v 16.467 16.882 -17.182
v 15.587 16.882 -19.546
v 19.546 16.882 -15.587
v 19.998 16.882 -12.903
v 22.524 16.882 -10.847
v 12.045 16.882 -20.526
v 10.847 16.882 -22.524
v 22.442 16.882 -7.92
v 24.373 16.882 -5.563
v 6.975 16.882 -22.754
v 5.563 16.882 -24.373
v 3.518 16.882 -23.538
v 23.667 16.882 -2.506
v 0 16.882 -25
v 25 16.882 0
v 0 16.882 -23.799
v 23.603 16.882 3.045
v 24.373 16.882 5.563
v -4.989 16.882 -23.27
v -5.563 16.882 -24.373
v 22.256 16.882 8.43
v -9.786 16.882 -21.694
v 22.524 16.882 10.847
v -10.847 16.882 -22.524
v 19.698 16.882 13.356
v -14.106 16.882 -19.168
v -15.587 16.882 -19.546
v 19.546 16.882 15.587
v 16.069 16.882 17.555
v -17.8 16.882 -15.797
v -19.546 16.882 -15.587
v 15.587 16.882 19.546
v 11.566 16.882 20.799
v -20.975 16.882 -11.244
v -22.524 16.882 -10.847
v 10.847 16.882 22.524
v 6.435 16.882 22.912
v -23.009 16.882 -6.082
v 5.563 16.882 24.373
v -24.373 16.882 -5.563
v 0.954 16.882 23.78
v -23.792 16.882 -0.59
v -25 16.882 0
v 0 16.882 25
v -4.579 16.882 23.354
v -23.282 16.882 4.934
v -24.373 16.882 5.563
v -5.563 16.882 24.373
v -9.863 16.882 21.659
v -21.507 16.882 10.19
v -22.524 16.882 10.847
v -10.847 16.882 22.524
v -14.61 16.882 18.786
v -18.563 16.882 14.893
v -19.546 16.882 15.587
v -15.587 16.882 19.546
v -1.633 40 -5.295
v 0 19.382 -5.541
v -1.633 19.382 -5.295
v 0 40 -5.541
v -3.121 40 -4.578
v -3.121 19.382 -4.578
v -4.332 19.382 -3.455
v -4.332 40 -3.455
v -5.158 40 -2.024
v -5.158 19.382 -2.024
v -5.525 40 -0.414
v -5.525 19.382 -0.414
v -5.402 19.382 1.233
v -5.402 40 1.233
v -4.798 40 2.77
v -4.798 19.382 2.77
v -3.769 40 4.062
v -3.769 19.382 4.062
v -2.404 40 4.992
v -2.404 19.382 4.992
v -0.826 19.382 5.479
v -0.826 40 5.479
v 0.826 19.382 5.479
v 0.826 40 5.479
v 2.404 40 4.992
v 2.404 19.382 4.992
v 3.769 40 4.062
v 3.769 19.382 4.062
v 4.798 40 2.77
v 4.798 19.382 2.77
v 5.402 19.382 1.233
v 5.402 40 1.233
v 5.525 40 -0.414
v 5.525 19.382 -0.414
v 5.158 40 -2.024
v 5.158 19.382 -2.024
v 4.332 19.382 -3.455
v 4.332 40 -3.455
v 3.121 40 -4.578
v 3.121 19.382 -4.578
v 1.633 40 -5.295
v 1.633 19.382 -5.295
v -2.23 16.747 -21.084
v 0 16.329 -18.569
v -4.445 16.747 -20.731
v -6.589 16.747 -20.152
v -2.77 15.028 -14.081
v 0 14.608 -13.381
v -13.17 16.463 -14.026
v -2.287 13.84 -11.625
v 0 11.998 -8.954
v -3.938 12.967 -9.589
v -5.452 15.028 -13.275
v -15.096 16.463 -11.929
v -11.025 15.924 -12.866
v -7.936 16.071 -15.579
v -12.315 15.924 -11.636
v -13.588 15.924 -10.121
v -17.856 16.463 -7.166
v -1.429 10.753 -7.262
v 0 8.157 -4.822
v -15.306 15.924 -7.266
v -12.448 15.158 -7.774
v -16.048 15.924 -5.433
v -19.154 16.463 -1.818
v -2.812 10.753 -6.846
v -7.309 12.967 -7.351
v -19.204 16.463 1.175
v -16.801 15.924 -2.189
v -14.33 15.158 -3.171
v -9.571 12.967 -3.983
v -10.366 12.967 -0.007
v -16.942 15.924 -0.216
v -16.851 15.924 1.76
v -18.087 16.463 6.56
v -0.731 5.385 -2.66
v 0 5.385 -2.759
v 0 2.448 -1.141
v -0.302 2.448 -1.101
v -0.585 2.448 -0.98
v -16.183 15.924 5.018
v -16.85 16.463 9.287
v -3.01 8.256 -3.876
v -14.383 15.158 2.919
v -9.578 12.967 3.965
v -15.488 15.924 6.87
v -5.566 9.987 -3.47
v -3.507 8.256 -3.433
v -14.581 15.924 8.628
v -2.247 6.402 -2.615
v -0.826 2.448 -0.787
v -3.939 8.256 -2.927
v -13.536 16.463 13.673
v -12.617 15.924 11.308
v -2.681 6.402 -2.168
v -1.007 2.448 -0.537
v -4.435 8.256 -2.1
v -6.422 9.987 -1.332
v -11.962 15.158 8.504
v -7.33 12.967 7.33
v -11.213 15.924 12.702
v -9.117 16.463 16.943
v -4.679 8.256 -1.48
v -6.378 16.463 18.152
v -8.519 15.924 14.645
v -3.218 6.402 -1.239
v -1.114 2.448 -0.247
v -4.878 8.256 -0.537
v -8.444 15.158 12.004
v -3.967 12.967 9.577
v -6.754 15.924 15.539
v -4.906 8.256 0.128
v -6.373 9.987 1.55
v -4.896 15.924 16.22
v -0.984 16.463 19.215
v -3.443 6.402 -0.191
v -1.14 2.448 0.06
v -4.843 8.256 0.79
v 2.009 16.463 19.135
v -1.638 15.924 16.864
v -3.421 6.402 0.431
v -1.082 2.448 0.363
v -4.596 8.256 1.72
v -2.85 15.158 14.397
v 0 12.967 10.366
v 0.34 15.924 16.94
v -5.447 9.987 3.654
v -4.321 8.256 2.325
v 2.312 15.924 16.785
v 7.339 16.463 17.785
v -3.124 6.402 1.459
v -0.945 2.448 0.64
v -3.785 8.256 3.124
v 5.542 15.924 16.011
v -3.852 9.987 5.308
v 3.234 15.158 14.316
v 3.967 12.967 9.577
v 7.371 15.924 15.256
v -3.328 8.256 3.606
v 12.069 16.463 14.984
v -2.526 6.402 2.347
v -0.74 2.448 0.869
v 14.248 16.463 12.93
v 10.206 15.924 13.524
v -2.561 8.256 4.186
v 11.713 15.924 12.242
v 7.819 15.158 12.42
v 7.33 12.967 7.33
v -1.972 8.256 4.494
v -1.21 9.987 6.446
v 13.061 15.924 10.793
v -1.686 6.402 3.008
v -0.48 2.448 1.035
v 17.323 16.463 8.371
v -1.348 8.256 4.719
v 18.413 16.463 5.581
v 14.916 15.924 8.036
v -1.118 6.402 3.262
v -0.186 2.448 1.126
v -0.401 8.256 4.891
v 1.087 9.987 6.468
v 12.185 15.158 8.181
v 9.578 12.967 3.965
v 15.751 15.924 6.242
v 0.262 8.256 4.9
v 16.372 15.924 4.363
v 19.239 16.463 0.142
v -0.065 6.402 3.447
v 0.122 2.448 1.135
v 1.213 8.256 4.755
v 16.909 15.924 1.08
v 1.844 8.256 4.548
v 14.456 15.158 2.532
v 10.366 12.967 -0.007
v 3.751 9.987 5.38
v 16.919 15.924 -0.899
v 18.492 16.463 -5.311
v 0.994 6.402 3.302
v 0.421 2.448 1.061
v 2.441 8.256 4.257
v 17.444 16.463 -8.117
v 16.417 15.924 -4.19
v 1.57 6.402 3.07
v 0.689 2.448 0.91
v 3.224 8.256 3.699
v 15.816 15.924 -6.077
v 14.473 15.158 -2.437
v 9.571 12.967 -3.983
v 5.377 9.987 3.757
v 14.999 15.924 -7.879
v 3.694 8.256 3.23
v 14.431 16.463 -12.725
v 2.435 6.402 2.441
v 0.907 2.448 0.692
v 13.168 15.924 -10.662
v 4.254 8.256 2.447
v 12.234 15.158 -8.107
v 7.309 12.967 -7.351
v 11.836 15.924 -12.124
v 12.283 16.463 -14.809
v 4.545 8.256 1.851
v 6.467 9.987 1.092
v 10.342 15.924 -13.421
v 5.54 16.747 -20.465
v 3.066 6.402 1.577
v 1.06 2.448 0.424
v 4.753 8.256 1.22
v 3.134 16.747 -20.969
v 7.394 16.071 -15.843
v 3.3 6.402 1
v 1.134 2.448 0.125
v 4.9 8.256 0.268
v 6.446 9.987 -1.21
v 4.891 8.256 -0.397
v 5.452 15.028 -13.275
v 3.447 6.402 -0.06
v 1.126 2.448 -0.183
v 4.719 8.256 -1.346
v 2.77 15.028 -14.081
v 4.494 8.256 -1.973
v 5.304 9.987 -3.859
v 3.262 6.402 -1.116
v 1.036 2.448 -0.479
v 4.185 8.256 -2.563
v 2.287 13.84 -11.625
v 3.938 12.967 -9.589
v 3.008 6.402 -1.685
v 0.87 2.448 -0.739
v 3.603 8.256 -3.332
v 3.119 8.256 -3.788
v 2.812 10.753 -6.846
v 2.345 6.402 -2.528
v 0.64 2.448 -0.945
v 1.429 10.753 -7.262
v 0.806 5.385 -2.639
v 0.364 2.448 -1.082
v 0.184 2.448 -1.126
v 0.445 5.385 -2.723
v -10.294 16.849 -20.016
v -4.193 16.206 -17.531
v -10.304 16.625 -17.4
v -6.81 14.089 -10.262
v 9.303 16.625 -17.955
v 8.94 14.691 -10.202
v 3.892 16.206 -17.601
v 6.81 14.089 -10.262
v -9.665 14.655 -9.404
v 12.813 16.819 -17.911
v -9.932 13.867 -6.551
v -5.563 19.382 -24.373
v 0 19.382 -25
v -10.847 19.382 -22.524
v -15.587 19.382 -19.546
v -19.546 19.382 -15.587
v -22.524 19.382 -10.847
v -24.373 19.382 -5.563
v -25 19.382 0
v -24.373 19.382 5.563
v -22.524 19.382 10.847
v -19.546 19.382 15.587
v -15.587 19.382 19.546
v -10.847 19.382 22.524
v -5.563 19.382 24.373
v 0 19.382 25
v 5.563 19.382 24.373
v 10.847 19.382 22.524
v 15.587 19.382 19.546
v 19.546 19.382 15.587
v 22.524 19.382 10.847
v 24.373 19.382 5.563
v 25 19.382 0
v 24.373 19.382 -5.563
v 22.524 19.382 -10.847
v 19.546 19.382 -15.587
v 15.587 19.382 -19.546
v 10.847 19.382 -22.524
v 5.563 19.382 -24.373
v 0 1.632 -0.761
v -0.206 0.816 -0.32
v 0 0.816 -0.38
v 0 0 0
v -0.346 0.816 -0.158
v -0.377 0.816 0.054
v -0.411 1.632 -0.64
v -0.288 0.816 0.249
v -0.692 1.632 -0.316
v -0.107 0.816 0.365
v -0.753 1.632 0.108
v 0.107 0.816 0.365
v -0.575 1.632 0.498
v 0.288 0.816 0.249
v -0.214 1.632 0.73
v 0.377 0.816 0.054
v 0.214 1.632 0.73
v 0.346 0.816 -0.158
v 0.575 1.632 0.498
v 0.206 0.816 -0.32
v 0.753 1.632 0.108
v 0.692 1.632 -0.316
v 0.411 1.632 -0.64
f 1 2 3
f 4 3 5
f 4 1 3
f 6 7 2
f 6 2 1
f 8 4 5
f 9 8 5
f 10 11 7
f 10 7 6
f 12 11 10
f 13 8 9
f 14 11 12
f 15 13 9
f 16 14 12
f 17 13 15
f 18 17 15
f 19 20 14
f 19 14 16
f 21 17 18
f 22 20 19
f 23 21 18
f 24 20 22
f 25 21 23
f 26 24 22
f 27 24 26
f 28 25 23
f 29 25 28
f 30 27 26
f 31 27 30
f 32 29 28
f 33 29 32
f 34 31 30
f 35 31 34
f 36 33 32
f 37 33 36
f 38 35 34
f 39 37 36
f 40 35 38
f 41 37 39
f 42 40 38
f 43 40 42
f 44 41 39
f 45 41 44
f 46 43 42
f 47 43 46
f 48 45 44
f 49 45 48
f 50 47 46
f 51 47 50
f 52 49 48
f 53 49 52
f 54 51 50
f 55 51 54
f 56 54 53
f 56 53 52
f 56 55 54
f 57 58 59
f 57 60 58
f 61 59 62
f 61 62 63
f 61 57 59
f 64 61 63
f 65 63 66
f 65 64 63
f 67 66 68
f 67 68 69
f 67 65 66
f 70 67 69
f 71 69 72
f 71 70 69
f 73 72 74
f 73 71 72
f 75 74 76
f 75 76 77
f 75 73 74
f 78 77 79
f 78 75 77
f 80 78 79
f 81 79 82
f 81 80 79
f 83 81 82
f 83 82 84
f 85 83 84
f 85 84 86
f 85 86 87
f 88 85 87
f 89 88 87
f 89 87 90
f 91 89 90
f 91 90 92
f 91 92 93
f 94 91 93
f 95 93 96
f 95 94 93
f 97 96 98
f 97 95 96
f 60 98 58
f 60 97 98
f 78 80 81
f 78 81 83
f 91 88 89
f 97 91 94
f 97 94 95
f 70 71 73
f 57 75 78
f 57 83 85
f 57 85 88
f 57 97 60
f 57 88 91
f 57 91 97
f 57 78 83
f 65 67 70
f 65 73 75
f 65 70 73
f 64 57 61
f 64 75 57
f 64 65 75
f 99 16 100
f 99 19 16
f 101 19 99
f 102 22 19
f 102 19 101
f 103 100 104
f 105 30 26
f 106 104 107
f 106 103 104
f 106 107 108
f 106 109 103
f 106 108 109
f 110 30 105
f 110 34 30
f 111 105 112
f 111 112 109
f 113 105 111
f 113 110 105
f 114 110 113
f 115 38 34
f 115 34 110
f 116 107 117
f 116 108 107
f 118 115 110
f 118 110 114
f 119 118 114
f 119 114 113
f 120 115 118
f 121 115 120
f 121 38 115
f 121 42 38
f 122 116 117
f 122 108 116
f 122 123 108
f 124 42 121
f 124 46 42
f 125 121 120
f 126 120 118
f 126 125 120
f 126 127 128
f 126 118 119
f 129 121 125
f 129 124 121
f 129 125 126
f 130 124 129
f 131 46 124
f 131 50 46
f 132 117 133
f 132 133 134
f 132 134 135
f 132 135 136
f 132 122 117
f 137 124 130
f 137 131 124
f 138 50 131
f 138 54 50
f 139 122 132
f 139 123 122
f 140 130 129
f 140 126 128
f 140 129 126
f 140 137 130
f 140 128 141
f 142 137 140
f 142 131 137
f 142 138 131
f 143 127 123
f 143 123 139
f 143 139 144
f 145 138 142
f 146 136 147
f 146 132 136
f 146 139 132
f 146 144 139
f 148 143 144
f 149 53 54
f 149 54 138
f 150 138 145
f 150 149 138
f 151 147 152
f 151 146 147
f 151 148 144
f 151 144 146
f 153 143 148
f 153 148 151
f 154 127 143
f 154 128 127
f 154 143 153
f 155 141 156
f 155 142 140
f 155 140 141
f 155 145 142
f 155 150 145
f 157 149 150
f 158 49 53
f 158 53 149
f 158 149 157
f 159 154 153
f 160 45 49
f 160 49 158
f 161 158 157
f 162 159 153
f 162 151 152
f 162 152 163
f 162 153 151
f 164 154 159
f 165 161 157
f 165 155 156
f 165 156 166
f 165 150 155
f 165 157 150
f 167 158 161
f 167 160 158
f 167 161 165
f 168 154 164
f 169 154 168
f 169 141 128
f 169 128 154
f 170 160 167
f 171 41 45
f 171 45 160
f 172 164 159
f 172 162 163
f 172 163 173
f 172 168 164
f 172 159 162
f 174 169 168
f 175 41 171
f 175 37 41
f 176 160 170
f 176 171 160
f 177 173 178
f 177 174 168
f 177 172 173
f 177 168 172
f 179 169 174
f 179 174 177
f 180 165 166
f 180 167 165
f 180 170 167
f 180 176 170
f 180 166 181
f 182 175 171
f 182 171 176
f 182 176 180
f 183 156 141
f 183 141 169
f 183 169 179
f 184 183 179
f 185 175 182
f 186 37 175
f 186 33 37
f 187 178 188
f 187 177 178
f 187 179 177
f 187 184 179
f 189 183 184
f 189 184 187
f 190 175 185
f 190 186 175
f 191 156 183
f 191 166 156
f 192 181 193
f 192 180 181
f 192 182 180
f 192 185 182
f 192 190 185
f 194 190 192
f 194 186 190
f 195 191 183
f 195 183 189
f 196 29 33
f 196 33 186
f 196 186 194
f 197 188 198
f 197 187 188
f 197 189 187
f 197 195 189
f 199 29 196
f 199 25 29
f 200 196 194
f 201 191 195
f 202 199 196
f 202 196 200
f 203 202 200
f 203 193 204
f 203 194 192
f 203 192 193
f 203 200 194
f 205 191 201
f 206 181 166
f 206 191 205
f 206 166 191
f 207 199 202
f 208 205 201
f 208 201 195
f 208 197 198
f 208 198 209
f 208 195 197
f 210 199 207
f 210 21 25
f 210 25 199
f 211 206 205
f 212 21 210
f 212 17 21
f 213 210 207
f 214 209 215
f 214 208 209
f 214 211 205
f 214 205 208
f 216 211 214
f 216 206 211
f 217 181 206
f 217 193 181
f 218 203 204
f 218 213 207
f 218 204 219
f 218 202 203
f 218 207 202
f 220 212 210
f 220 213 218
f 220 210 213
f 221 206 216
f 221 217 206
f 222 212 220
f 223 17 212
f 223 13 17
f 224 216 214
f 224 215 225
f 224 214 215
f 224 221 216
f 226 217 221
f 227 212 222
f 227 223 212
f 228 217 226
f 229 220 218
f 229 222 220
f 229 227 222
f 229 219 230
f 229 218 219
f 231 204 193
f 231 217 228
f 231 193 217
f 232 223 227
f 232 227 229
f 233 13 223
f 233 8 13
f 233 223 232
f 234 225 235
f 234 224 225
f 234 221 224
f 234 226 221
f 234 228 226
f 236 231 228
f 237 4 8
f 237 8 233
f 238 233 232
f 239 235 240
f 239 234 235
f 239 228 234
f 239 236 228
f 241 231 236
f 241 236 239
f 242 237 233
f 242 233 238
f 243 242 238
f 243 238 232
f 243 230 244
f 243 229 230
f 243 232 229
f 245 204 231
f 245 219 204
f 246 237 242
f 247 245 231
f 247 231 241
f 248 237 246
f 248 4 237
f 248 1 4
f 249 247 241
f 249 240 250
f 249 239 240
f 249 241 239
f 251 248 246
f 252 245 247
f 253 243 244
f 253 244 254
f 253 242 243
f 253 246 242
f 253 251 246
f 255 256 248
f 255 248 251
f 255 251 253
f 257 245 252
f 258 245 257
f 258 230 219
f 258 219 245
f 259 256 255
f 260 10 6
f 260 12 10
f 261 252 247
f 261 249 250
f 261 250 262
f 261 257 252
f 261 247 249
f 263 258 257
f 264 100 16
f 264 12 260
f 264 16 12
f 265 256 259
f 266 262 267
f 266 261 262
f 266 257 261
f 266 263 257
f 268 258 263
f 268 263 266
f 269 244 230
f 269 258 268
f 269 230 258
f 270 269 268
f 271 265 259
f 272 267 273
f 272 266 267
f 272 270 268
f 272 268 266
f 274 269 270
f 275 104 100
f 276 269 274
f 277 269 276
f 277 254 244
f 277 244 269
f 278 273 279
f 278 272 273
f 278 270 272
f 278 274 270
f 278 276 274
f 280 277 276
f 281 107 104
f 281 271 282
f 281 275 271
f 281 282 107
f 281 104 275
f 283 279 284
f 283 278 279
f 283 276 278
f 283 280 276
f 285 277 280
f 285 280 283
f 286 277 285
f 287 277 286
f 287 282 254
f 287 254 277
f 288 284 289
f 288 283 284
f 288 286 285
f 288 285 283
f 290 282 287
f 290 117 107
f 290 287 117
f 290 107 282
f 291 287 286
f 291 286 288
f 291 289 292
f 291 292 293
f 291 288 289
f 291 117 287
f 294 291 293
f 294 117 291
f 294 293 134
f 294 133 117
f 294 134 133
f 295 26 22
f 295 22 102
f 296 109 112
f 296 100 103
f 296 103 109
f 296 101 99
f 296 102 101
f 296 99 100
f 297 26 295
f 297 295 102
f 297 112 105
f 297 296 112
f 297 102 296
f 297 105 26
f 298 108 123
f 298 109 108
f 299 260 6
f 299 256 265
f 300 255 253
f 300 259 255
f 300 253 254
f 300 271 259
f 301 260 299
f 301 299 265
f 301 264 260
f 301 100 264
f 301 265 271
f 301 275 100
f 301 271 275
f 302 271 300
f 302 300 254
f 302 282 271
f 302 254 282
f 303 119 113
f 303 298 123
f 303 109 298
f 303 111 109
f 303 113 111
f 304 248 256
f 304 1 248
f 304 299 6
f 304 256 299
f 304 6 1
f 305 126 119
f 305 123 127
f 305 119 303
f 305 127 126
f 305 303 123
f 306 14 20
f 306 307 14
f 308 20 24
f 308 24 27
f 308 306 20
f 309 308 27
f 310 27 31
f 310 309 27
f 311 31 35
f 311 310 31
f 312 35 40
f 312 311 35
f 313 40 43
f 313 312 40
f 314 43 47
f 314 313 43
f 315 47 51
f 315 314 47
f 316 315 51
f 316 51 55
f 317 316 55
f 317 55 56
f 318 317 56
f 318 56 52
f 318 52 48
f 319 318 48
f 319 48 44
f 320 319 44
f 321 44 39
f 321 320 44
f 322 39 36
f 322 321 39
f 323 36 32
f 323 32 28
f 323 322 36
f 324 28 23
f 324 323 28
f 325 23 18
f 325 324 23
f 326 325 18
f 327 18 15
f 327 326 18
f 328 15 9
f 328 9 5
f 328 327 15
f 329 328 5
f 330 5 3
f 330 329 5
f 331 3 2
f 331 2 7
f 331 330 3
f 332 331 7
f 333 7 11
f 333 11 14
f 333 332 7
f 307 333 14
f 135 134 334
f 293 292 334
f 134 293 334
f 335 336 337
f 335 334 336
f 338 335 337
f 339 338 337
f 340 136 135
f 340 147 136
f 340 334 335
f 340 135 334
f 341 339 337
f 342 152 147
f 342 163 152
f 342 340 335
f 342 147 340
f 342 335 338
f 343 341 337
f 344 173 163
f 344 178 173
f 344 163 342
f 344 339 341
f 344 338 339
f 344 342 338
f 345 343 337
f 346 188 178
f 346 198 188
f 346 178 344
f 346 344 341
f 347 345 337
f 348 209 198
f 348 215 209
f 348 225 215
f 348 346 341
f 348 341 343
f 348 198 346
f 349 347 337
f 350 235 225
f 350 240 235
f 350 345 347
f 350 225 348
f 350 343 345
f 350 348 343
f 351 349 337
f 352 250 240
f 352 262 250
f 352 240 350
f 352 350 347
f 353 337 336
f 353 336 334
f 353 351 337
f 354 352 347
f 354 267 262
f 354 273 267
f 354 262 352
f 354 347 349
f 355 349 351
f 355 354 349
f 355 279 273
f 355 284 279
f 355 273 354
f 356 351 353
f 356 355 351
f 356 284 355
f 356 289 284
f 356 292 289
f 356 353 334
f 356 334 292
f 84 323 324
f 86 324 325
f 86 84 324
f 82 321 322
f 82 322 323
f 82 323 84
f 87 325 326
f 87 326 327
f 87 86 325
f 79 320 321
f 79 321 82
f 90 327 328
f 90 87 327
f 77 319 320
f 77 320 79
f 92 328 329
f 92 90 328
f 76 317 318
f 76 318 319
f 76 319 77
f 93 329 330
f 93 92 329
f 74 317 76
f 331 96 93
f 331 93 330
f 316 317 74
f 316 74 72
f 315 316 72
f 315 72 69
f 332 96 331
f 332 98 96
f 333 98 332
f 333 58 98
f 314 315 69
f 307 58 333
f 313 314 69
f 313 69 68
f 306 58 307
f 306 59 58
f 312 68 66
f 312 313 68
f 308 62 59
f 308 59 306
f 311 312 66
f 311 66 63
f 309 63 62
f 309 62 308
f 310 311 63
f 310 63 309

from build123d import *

# Parameters (mm, degrees)
FILLET1_R  = 25
FILLET11_R = 25


# Some blends are built 0.0001 mm under size
with BuildPart() as part:
    # Sketch1 → Revolve1 (revolve)
    with BuildSketch(Plane(origin=(0, 0, 0), x_dir=(0, 0, -1), z_dir=(1, 0, 0))):
        Polygon((0, 0), (5.540701052, 11.882071751), (5.540701052, 16.882071751), (25, 16.882071751), (25, 19.382071751), (5.540701052, 19.382071751), (5.540701052, 40), (0, 40), align=None)
    revolve(axis=Axis((0, 0, 0), (0, 1, 0)))

    # Fillet1
    # the kernel refuses this fillet: 25 mm, written as the material it adds along each edge
    with BuildSketch(Plane(origin=(0, 16.882071751, 0), x_dir=(0, 0, -1), z_dir=(1, 0, 0))) as fillet1_piece_1:
        with BuildLine():
            CenterArc((20.540701052, -25), FILLET1_R, 90, 36.869897646)
            Line((20.540701052, 0), (20.540701052, 0.5))
            Line((20.540701052, 0.5), (5.540701052, 0.5))
            Line((5.540701052, 0.5), (5.040701052, 0))
            ThreePointArc((5.040701052, 0), (5.040701052, -2.5), (5.240701052, -4.6))
            Line((5.240701052, -4.6), (5.540701052, -5))
        make_face()
    revolve(axis=Axis((0, 16.882071751, 0), (0, 1, 0)))

    # Fillet11
    fillet11_edges = [part.edges().sort_by_distance(p)[0] for p in [
        (0, 11.882071751, 5.540701052),
    ]]
    fillet(fillet11_edges, radius=FILLET11_R - 0.0001)  # a hair under: the kernel refuses the full size


solid = part.part
